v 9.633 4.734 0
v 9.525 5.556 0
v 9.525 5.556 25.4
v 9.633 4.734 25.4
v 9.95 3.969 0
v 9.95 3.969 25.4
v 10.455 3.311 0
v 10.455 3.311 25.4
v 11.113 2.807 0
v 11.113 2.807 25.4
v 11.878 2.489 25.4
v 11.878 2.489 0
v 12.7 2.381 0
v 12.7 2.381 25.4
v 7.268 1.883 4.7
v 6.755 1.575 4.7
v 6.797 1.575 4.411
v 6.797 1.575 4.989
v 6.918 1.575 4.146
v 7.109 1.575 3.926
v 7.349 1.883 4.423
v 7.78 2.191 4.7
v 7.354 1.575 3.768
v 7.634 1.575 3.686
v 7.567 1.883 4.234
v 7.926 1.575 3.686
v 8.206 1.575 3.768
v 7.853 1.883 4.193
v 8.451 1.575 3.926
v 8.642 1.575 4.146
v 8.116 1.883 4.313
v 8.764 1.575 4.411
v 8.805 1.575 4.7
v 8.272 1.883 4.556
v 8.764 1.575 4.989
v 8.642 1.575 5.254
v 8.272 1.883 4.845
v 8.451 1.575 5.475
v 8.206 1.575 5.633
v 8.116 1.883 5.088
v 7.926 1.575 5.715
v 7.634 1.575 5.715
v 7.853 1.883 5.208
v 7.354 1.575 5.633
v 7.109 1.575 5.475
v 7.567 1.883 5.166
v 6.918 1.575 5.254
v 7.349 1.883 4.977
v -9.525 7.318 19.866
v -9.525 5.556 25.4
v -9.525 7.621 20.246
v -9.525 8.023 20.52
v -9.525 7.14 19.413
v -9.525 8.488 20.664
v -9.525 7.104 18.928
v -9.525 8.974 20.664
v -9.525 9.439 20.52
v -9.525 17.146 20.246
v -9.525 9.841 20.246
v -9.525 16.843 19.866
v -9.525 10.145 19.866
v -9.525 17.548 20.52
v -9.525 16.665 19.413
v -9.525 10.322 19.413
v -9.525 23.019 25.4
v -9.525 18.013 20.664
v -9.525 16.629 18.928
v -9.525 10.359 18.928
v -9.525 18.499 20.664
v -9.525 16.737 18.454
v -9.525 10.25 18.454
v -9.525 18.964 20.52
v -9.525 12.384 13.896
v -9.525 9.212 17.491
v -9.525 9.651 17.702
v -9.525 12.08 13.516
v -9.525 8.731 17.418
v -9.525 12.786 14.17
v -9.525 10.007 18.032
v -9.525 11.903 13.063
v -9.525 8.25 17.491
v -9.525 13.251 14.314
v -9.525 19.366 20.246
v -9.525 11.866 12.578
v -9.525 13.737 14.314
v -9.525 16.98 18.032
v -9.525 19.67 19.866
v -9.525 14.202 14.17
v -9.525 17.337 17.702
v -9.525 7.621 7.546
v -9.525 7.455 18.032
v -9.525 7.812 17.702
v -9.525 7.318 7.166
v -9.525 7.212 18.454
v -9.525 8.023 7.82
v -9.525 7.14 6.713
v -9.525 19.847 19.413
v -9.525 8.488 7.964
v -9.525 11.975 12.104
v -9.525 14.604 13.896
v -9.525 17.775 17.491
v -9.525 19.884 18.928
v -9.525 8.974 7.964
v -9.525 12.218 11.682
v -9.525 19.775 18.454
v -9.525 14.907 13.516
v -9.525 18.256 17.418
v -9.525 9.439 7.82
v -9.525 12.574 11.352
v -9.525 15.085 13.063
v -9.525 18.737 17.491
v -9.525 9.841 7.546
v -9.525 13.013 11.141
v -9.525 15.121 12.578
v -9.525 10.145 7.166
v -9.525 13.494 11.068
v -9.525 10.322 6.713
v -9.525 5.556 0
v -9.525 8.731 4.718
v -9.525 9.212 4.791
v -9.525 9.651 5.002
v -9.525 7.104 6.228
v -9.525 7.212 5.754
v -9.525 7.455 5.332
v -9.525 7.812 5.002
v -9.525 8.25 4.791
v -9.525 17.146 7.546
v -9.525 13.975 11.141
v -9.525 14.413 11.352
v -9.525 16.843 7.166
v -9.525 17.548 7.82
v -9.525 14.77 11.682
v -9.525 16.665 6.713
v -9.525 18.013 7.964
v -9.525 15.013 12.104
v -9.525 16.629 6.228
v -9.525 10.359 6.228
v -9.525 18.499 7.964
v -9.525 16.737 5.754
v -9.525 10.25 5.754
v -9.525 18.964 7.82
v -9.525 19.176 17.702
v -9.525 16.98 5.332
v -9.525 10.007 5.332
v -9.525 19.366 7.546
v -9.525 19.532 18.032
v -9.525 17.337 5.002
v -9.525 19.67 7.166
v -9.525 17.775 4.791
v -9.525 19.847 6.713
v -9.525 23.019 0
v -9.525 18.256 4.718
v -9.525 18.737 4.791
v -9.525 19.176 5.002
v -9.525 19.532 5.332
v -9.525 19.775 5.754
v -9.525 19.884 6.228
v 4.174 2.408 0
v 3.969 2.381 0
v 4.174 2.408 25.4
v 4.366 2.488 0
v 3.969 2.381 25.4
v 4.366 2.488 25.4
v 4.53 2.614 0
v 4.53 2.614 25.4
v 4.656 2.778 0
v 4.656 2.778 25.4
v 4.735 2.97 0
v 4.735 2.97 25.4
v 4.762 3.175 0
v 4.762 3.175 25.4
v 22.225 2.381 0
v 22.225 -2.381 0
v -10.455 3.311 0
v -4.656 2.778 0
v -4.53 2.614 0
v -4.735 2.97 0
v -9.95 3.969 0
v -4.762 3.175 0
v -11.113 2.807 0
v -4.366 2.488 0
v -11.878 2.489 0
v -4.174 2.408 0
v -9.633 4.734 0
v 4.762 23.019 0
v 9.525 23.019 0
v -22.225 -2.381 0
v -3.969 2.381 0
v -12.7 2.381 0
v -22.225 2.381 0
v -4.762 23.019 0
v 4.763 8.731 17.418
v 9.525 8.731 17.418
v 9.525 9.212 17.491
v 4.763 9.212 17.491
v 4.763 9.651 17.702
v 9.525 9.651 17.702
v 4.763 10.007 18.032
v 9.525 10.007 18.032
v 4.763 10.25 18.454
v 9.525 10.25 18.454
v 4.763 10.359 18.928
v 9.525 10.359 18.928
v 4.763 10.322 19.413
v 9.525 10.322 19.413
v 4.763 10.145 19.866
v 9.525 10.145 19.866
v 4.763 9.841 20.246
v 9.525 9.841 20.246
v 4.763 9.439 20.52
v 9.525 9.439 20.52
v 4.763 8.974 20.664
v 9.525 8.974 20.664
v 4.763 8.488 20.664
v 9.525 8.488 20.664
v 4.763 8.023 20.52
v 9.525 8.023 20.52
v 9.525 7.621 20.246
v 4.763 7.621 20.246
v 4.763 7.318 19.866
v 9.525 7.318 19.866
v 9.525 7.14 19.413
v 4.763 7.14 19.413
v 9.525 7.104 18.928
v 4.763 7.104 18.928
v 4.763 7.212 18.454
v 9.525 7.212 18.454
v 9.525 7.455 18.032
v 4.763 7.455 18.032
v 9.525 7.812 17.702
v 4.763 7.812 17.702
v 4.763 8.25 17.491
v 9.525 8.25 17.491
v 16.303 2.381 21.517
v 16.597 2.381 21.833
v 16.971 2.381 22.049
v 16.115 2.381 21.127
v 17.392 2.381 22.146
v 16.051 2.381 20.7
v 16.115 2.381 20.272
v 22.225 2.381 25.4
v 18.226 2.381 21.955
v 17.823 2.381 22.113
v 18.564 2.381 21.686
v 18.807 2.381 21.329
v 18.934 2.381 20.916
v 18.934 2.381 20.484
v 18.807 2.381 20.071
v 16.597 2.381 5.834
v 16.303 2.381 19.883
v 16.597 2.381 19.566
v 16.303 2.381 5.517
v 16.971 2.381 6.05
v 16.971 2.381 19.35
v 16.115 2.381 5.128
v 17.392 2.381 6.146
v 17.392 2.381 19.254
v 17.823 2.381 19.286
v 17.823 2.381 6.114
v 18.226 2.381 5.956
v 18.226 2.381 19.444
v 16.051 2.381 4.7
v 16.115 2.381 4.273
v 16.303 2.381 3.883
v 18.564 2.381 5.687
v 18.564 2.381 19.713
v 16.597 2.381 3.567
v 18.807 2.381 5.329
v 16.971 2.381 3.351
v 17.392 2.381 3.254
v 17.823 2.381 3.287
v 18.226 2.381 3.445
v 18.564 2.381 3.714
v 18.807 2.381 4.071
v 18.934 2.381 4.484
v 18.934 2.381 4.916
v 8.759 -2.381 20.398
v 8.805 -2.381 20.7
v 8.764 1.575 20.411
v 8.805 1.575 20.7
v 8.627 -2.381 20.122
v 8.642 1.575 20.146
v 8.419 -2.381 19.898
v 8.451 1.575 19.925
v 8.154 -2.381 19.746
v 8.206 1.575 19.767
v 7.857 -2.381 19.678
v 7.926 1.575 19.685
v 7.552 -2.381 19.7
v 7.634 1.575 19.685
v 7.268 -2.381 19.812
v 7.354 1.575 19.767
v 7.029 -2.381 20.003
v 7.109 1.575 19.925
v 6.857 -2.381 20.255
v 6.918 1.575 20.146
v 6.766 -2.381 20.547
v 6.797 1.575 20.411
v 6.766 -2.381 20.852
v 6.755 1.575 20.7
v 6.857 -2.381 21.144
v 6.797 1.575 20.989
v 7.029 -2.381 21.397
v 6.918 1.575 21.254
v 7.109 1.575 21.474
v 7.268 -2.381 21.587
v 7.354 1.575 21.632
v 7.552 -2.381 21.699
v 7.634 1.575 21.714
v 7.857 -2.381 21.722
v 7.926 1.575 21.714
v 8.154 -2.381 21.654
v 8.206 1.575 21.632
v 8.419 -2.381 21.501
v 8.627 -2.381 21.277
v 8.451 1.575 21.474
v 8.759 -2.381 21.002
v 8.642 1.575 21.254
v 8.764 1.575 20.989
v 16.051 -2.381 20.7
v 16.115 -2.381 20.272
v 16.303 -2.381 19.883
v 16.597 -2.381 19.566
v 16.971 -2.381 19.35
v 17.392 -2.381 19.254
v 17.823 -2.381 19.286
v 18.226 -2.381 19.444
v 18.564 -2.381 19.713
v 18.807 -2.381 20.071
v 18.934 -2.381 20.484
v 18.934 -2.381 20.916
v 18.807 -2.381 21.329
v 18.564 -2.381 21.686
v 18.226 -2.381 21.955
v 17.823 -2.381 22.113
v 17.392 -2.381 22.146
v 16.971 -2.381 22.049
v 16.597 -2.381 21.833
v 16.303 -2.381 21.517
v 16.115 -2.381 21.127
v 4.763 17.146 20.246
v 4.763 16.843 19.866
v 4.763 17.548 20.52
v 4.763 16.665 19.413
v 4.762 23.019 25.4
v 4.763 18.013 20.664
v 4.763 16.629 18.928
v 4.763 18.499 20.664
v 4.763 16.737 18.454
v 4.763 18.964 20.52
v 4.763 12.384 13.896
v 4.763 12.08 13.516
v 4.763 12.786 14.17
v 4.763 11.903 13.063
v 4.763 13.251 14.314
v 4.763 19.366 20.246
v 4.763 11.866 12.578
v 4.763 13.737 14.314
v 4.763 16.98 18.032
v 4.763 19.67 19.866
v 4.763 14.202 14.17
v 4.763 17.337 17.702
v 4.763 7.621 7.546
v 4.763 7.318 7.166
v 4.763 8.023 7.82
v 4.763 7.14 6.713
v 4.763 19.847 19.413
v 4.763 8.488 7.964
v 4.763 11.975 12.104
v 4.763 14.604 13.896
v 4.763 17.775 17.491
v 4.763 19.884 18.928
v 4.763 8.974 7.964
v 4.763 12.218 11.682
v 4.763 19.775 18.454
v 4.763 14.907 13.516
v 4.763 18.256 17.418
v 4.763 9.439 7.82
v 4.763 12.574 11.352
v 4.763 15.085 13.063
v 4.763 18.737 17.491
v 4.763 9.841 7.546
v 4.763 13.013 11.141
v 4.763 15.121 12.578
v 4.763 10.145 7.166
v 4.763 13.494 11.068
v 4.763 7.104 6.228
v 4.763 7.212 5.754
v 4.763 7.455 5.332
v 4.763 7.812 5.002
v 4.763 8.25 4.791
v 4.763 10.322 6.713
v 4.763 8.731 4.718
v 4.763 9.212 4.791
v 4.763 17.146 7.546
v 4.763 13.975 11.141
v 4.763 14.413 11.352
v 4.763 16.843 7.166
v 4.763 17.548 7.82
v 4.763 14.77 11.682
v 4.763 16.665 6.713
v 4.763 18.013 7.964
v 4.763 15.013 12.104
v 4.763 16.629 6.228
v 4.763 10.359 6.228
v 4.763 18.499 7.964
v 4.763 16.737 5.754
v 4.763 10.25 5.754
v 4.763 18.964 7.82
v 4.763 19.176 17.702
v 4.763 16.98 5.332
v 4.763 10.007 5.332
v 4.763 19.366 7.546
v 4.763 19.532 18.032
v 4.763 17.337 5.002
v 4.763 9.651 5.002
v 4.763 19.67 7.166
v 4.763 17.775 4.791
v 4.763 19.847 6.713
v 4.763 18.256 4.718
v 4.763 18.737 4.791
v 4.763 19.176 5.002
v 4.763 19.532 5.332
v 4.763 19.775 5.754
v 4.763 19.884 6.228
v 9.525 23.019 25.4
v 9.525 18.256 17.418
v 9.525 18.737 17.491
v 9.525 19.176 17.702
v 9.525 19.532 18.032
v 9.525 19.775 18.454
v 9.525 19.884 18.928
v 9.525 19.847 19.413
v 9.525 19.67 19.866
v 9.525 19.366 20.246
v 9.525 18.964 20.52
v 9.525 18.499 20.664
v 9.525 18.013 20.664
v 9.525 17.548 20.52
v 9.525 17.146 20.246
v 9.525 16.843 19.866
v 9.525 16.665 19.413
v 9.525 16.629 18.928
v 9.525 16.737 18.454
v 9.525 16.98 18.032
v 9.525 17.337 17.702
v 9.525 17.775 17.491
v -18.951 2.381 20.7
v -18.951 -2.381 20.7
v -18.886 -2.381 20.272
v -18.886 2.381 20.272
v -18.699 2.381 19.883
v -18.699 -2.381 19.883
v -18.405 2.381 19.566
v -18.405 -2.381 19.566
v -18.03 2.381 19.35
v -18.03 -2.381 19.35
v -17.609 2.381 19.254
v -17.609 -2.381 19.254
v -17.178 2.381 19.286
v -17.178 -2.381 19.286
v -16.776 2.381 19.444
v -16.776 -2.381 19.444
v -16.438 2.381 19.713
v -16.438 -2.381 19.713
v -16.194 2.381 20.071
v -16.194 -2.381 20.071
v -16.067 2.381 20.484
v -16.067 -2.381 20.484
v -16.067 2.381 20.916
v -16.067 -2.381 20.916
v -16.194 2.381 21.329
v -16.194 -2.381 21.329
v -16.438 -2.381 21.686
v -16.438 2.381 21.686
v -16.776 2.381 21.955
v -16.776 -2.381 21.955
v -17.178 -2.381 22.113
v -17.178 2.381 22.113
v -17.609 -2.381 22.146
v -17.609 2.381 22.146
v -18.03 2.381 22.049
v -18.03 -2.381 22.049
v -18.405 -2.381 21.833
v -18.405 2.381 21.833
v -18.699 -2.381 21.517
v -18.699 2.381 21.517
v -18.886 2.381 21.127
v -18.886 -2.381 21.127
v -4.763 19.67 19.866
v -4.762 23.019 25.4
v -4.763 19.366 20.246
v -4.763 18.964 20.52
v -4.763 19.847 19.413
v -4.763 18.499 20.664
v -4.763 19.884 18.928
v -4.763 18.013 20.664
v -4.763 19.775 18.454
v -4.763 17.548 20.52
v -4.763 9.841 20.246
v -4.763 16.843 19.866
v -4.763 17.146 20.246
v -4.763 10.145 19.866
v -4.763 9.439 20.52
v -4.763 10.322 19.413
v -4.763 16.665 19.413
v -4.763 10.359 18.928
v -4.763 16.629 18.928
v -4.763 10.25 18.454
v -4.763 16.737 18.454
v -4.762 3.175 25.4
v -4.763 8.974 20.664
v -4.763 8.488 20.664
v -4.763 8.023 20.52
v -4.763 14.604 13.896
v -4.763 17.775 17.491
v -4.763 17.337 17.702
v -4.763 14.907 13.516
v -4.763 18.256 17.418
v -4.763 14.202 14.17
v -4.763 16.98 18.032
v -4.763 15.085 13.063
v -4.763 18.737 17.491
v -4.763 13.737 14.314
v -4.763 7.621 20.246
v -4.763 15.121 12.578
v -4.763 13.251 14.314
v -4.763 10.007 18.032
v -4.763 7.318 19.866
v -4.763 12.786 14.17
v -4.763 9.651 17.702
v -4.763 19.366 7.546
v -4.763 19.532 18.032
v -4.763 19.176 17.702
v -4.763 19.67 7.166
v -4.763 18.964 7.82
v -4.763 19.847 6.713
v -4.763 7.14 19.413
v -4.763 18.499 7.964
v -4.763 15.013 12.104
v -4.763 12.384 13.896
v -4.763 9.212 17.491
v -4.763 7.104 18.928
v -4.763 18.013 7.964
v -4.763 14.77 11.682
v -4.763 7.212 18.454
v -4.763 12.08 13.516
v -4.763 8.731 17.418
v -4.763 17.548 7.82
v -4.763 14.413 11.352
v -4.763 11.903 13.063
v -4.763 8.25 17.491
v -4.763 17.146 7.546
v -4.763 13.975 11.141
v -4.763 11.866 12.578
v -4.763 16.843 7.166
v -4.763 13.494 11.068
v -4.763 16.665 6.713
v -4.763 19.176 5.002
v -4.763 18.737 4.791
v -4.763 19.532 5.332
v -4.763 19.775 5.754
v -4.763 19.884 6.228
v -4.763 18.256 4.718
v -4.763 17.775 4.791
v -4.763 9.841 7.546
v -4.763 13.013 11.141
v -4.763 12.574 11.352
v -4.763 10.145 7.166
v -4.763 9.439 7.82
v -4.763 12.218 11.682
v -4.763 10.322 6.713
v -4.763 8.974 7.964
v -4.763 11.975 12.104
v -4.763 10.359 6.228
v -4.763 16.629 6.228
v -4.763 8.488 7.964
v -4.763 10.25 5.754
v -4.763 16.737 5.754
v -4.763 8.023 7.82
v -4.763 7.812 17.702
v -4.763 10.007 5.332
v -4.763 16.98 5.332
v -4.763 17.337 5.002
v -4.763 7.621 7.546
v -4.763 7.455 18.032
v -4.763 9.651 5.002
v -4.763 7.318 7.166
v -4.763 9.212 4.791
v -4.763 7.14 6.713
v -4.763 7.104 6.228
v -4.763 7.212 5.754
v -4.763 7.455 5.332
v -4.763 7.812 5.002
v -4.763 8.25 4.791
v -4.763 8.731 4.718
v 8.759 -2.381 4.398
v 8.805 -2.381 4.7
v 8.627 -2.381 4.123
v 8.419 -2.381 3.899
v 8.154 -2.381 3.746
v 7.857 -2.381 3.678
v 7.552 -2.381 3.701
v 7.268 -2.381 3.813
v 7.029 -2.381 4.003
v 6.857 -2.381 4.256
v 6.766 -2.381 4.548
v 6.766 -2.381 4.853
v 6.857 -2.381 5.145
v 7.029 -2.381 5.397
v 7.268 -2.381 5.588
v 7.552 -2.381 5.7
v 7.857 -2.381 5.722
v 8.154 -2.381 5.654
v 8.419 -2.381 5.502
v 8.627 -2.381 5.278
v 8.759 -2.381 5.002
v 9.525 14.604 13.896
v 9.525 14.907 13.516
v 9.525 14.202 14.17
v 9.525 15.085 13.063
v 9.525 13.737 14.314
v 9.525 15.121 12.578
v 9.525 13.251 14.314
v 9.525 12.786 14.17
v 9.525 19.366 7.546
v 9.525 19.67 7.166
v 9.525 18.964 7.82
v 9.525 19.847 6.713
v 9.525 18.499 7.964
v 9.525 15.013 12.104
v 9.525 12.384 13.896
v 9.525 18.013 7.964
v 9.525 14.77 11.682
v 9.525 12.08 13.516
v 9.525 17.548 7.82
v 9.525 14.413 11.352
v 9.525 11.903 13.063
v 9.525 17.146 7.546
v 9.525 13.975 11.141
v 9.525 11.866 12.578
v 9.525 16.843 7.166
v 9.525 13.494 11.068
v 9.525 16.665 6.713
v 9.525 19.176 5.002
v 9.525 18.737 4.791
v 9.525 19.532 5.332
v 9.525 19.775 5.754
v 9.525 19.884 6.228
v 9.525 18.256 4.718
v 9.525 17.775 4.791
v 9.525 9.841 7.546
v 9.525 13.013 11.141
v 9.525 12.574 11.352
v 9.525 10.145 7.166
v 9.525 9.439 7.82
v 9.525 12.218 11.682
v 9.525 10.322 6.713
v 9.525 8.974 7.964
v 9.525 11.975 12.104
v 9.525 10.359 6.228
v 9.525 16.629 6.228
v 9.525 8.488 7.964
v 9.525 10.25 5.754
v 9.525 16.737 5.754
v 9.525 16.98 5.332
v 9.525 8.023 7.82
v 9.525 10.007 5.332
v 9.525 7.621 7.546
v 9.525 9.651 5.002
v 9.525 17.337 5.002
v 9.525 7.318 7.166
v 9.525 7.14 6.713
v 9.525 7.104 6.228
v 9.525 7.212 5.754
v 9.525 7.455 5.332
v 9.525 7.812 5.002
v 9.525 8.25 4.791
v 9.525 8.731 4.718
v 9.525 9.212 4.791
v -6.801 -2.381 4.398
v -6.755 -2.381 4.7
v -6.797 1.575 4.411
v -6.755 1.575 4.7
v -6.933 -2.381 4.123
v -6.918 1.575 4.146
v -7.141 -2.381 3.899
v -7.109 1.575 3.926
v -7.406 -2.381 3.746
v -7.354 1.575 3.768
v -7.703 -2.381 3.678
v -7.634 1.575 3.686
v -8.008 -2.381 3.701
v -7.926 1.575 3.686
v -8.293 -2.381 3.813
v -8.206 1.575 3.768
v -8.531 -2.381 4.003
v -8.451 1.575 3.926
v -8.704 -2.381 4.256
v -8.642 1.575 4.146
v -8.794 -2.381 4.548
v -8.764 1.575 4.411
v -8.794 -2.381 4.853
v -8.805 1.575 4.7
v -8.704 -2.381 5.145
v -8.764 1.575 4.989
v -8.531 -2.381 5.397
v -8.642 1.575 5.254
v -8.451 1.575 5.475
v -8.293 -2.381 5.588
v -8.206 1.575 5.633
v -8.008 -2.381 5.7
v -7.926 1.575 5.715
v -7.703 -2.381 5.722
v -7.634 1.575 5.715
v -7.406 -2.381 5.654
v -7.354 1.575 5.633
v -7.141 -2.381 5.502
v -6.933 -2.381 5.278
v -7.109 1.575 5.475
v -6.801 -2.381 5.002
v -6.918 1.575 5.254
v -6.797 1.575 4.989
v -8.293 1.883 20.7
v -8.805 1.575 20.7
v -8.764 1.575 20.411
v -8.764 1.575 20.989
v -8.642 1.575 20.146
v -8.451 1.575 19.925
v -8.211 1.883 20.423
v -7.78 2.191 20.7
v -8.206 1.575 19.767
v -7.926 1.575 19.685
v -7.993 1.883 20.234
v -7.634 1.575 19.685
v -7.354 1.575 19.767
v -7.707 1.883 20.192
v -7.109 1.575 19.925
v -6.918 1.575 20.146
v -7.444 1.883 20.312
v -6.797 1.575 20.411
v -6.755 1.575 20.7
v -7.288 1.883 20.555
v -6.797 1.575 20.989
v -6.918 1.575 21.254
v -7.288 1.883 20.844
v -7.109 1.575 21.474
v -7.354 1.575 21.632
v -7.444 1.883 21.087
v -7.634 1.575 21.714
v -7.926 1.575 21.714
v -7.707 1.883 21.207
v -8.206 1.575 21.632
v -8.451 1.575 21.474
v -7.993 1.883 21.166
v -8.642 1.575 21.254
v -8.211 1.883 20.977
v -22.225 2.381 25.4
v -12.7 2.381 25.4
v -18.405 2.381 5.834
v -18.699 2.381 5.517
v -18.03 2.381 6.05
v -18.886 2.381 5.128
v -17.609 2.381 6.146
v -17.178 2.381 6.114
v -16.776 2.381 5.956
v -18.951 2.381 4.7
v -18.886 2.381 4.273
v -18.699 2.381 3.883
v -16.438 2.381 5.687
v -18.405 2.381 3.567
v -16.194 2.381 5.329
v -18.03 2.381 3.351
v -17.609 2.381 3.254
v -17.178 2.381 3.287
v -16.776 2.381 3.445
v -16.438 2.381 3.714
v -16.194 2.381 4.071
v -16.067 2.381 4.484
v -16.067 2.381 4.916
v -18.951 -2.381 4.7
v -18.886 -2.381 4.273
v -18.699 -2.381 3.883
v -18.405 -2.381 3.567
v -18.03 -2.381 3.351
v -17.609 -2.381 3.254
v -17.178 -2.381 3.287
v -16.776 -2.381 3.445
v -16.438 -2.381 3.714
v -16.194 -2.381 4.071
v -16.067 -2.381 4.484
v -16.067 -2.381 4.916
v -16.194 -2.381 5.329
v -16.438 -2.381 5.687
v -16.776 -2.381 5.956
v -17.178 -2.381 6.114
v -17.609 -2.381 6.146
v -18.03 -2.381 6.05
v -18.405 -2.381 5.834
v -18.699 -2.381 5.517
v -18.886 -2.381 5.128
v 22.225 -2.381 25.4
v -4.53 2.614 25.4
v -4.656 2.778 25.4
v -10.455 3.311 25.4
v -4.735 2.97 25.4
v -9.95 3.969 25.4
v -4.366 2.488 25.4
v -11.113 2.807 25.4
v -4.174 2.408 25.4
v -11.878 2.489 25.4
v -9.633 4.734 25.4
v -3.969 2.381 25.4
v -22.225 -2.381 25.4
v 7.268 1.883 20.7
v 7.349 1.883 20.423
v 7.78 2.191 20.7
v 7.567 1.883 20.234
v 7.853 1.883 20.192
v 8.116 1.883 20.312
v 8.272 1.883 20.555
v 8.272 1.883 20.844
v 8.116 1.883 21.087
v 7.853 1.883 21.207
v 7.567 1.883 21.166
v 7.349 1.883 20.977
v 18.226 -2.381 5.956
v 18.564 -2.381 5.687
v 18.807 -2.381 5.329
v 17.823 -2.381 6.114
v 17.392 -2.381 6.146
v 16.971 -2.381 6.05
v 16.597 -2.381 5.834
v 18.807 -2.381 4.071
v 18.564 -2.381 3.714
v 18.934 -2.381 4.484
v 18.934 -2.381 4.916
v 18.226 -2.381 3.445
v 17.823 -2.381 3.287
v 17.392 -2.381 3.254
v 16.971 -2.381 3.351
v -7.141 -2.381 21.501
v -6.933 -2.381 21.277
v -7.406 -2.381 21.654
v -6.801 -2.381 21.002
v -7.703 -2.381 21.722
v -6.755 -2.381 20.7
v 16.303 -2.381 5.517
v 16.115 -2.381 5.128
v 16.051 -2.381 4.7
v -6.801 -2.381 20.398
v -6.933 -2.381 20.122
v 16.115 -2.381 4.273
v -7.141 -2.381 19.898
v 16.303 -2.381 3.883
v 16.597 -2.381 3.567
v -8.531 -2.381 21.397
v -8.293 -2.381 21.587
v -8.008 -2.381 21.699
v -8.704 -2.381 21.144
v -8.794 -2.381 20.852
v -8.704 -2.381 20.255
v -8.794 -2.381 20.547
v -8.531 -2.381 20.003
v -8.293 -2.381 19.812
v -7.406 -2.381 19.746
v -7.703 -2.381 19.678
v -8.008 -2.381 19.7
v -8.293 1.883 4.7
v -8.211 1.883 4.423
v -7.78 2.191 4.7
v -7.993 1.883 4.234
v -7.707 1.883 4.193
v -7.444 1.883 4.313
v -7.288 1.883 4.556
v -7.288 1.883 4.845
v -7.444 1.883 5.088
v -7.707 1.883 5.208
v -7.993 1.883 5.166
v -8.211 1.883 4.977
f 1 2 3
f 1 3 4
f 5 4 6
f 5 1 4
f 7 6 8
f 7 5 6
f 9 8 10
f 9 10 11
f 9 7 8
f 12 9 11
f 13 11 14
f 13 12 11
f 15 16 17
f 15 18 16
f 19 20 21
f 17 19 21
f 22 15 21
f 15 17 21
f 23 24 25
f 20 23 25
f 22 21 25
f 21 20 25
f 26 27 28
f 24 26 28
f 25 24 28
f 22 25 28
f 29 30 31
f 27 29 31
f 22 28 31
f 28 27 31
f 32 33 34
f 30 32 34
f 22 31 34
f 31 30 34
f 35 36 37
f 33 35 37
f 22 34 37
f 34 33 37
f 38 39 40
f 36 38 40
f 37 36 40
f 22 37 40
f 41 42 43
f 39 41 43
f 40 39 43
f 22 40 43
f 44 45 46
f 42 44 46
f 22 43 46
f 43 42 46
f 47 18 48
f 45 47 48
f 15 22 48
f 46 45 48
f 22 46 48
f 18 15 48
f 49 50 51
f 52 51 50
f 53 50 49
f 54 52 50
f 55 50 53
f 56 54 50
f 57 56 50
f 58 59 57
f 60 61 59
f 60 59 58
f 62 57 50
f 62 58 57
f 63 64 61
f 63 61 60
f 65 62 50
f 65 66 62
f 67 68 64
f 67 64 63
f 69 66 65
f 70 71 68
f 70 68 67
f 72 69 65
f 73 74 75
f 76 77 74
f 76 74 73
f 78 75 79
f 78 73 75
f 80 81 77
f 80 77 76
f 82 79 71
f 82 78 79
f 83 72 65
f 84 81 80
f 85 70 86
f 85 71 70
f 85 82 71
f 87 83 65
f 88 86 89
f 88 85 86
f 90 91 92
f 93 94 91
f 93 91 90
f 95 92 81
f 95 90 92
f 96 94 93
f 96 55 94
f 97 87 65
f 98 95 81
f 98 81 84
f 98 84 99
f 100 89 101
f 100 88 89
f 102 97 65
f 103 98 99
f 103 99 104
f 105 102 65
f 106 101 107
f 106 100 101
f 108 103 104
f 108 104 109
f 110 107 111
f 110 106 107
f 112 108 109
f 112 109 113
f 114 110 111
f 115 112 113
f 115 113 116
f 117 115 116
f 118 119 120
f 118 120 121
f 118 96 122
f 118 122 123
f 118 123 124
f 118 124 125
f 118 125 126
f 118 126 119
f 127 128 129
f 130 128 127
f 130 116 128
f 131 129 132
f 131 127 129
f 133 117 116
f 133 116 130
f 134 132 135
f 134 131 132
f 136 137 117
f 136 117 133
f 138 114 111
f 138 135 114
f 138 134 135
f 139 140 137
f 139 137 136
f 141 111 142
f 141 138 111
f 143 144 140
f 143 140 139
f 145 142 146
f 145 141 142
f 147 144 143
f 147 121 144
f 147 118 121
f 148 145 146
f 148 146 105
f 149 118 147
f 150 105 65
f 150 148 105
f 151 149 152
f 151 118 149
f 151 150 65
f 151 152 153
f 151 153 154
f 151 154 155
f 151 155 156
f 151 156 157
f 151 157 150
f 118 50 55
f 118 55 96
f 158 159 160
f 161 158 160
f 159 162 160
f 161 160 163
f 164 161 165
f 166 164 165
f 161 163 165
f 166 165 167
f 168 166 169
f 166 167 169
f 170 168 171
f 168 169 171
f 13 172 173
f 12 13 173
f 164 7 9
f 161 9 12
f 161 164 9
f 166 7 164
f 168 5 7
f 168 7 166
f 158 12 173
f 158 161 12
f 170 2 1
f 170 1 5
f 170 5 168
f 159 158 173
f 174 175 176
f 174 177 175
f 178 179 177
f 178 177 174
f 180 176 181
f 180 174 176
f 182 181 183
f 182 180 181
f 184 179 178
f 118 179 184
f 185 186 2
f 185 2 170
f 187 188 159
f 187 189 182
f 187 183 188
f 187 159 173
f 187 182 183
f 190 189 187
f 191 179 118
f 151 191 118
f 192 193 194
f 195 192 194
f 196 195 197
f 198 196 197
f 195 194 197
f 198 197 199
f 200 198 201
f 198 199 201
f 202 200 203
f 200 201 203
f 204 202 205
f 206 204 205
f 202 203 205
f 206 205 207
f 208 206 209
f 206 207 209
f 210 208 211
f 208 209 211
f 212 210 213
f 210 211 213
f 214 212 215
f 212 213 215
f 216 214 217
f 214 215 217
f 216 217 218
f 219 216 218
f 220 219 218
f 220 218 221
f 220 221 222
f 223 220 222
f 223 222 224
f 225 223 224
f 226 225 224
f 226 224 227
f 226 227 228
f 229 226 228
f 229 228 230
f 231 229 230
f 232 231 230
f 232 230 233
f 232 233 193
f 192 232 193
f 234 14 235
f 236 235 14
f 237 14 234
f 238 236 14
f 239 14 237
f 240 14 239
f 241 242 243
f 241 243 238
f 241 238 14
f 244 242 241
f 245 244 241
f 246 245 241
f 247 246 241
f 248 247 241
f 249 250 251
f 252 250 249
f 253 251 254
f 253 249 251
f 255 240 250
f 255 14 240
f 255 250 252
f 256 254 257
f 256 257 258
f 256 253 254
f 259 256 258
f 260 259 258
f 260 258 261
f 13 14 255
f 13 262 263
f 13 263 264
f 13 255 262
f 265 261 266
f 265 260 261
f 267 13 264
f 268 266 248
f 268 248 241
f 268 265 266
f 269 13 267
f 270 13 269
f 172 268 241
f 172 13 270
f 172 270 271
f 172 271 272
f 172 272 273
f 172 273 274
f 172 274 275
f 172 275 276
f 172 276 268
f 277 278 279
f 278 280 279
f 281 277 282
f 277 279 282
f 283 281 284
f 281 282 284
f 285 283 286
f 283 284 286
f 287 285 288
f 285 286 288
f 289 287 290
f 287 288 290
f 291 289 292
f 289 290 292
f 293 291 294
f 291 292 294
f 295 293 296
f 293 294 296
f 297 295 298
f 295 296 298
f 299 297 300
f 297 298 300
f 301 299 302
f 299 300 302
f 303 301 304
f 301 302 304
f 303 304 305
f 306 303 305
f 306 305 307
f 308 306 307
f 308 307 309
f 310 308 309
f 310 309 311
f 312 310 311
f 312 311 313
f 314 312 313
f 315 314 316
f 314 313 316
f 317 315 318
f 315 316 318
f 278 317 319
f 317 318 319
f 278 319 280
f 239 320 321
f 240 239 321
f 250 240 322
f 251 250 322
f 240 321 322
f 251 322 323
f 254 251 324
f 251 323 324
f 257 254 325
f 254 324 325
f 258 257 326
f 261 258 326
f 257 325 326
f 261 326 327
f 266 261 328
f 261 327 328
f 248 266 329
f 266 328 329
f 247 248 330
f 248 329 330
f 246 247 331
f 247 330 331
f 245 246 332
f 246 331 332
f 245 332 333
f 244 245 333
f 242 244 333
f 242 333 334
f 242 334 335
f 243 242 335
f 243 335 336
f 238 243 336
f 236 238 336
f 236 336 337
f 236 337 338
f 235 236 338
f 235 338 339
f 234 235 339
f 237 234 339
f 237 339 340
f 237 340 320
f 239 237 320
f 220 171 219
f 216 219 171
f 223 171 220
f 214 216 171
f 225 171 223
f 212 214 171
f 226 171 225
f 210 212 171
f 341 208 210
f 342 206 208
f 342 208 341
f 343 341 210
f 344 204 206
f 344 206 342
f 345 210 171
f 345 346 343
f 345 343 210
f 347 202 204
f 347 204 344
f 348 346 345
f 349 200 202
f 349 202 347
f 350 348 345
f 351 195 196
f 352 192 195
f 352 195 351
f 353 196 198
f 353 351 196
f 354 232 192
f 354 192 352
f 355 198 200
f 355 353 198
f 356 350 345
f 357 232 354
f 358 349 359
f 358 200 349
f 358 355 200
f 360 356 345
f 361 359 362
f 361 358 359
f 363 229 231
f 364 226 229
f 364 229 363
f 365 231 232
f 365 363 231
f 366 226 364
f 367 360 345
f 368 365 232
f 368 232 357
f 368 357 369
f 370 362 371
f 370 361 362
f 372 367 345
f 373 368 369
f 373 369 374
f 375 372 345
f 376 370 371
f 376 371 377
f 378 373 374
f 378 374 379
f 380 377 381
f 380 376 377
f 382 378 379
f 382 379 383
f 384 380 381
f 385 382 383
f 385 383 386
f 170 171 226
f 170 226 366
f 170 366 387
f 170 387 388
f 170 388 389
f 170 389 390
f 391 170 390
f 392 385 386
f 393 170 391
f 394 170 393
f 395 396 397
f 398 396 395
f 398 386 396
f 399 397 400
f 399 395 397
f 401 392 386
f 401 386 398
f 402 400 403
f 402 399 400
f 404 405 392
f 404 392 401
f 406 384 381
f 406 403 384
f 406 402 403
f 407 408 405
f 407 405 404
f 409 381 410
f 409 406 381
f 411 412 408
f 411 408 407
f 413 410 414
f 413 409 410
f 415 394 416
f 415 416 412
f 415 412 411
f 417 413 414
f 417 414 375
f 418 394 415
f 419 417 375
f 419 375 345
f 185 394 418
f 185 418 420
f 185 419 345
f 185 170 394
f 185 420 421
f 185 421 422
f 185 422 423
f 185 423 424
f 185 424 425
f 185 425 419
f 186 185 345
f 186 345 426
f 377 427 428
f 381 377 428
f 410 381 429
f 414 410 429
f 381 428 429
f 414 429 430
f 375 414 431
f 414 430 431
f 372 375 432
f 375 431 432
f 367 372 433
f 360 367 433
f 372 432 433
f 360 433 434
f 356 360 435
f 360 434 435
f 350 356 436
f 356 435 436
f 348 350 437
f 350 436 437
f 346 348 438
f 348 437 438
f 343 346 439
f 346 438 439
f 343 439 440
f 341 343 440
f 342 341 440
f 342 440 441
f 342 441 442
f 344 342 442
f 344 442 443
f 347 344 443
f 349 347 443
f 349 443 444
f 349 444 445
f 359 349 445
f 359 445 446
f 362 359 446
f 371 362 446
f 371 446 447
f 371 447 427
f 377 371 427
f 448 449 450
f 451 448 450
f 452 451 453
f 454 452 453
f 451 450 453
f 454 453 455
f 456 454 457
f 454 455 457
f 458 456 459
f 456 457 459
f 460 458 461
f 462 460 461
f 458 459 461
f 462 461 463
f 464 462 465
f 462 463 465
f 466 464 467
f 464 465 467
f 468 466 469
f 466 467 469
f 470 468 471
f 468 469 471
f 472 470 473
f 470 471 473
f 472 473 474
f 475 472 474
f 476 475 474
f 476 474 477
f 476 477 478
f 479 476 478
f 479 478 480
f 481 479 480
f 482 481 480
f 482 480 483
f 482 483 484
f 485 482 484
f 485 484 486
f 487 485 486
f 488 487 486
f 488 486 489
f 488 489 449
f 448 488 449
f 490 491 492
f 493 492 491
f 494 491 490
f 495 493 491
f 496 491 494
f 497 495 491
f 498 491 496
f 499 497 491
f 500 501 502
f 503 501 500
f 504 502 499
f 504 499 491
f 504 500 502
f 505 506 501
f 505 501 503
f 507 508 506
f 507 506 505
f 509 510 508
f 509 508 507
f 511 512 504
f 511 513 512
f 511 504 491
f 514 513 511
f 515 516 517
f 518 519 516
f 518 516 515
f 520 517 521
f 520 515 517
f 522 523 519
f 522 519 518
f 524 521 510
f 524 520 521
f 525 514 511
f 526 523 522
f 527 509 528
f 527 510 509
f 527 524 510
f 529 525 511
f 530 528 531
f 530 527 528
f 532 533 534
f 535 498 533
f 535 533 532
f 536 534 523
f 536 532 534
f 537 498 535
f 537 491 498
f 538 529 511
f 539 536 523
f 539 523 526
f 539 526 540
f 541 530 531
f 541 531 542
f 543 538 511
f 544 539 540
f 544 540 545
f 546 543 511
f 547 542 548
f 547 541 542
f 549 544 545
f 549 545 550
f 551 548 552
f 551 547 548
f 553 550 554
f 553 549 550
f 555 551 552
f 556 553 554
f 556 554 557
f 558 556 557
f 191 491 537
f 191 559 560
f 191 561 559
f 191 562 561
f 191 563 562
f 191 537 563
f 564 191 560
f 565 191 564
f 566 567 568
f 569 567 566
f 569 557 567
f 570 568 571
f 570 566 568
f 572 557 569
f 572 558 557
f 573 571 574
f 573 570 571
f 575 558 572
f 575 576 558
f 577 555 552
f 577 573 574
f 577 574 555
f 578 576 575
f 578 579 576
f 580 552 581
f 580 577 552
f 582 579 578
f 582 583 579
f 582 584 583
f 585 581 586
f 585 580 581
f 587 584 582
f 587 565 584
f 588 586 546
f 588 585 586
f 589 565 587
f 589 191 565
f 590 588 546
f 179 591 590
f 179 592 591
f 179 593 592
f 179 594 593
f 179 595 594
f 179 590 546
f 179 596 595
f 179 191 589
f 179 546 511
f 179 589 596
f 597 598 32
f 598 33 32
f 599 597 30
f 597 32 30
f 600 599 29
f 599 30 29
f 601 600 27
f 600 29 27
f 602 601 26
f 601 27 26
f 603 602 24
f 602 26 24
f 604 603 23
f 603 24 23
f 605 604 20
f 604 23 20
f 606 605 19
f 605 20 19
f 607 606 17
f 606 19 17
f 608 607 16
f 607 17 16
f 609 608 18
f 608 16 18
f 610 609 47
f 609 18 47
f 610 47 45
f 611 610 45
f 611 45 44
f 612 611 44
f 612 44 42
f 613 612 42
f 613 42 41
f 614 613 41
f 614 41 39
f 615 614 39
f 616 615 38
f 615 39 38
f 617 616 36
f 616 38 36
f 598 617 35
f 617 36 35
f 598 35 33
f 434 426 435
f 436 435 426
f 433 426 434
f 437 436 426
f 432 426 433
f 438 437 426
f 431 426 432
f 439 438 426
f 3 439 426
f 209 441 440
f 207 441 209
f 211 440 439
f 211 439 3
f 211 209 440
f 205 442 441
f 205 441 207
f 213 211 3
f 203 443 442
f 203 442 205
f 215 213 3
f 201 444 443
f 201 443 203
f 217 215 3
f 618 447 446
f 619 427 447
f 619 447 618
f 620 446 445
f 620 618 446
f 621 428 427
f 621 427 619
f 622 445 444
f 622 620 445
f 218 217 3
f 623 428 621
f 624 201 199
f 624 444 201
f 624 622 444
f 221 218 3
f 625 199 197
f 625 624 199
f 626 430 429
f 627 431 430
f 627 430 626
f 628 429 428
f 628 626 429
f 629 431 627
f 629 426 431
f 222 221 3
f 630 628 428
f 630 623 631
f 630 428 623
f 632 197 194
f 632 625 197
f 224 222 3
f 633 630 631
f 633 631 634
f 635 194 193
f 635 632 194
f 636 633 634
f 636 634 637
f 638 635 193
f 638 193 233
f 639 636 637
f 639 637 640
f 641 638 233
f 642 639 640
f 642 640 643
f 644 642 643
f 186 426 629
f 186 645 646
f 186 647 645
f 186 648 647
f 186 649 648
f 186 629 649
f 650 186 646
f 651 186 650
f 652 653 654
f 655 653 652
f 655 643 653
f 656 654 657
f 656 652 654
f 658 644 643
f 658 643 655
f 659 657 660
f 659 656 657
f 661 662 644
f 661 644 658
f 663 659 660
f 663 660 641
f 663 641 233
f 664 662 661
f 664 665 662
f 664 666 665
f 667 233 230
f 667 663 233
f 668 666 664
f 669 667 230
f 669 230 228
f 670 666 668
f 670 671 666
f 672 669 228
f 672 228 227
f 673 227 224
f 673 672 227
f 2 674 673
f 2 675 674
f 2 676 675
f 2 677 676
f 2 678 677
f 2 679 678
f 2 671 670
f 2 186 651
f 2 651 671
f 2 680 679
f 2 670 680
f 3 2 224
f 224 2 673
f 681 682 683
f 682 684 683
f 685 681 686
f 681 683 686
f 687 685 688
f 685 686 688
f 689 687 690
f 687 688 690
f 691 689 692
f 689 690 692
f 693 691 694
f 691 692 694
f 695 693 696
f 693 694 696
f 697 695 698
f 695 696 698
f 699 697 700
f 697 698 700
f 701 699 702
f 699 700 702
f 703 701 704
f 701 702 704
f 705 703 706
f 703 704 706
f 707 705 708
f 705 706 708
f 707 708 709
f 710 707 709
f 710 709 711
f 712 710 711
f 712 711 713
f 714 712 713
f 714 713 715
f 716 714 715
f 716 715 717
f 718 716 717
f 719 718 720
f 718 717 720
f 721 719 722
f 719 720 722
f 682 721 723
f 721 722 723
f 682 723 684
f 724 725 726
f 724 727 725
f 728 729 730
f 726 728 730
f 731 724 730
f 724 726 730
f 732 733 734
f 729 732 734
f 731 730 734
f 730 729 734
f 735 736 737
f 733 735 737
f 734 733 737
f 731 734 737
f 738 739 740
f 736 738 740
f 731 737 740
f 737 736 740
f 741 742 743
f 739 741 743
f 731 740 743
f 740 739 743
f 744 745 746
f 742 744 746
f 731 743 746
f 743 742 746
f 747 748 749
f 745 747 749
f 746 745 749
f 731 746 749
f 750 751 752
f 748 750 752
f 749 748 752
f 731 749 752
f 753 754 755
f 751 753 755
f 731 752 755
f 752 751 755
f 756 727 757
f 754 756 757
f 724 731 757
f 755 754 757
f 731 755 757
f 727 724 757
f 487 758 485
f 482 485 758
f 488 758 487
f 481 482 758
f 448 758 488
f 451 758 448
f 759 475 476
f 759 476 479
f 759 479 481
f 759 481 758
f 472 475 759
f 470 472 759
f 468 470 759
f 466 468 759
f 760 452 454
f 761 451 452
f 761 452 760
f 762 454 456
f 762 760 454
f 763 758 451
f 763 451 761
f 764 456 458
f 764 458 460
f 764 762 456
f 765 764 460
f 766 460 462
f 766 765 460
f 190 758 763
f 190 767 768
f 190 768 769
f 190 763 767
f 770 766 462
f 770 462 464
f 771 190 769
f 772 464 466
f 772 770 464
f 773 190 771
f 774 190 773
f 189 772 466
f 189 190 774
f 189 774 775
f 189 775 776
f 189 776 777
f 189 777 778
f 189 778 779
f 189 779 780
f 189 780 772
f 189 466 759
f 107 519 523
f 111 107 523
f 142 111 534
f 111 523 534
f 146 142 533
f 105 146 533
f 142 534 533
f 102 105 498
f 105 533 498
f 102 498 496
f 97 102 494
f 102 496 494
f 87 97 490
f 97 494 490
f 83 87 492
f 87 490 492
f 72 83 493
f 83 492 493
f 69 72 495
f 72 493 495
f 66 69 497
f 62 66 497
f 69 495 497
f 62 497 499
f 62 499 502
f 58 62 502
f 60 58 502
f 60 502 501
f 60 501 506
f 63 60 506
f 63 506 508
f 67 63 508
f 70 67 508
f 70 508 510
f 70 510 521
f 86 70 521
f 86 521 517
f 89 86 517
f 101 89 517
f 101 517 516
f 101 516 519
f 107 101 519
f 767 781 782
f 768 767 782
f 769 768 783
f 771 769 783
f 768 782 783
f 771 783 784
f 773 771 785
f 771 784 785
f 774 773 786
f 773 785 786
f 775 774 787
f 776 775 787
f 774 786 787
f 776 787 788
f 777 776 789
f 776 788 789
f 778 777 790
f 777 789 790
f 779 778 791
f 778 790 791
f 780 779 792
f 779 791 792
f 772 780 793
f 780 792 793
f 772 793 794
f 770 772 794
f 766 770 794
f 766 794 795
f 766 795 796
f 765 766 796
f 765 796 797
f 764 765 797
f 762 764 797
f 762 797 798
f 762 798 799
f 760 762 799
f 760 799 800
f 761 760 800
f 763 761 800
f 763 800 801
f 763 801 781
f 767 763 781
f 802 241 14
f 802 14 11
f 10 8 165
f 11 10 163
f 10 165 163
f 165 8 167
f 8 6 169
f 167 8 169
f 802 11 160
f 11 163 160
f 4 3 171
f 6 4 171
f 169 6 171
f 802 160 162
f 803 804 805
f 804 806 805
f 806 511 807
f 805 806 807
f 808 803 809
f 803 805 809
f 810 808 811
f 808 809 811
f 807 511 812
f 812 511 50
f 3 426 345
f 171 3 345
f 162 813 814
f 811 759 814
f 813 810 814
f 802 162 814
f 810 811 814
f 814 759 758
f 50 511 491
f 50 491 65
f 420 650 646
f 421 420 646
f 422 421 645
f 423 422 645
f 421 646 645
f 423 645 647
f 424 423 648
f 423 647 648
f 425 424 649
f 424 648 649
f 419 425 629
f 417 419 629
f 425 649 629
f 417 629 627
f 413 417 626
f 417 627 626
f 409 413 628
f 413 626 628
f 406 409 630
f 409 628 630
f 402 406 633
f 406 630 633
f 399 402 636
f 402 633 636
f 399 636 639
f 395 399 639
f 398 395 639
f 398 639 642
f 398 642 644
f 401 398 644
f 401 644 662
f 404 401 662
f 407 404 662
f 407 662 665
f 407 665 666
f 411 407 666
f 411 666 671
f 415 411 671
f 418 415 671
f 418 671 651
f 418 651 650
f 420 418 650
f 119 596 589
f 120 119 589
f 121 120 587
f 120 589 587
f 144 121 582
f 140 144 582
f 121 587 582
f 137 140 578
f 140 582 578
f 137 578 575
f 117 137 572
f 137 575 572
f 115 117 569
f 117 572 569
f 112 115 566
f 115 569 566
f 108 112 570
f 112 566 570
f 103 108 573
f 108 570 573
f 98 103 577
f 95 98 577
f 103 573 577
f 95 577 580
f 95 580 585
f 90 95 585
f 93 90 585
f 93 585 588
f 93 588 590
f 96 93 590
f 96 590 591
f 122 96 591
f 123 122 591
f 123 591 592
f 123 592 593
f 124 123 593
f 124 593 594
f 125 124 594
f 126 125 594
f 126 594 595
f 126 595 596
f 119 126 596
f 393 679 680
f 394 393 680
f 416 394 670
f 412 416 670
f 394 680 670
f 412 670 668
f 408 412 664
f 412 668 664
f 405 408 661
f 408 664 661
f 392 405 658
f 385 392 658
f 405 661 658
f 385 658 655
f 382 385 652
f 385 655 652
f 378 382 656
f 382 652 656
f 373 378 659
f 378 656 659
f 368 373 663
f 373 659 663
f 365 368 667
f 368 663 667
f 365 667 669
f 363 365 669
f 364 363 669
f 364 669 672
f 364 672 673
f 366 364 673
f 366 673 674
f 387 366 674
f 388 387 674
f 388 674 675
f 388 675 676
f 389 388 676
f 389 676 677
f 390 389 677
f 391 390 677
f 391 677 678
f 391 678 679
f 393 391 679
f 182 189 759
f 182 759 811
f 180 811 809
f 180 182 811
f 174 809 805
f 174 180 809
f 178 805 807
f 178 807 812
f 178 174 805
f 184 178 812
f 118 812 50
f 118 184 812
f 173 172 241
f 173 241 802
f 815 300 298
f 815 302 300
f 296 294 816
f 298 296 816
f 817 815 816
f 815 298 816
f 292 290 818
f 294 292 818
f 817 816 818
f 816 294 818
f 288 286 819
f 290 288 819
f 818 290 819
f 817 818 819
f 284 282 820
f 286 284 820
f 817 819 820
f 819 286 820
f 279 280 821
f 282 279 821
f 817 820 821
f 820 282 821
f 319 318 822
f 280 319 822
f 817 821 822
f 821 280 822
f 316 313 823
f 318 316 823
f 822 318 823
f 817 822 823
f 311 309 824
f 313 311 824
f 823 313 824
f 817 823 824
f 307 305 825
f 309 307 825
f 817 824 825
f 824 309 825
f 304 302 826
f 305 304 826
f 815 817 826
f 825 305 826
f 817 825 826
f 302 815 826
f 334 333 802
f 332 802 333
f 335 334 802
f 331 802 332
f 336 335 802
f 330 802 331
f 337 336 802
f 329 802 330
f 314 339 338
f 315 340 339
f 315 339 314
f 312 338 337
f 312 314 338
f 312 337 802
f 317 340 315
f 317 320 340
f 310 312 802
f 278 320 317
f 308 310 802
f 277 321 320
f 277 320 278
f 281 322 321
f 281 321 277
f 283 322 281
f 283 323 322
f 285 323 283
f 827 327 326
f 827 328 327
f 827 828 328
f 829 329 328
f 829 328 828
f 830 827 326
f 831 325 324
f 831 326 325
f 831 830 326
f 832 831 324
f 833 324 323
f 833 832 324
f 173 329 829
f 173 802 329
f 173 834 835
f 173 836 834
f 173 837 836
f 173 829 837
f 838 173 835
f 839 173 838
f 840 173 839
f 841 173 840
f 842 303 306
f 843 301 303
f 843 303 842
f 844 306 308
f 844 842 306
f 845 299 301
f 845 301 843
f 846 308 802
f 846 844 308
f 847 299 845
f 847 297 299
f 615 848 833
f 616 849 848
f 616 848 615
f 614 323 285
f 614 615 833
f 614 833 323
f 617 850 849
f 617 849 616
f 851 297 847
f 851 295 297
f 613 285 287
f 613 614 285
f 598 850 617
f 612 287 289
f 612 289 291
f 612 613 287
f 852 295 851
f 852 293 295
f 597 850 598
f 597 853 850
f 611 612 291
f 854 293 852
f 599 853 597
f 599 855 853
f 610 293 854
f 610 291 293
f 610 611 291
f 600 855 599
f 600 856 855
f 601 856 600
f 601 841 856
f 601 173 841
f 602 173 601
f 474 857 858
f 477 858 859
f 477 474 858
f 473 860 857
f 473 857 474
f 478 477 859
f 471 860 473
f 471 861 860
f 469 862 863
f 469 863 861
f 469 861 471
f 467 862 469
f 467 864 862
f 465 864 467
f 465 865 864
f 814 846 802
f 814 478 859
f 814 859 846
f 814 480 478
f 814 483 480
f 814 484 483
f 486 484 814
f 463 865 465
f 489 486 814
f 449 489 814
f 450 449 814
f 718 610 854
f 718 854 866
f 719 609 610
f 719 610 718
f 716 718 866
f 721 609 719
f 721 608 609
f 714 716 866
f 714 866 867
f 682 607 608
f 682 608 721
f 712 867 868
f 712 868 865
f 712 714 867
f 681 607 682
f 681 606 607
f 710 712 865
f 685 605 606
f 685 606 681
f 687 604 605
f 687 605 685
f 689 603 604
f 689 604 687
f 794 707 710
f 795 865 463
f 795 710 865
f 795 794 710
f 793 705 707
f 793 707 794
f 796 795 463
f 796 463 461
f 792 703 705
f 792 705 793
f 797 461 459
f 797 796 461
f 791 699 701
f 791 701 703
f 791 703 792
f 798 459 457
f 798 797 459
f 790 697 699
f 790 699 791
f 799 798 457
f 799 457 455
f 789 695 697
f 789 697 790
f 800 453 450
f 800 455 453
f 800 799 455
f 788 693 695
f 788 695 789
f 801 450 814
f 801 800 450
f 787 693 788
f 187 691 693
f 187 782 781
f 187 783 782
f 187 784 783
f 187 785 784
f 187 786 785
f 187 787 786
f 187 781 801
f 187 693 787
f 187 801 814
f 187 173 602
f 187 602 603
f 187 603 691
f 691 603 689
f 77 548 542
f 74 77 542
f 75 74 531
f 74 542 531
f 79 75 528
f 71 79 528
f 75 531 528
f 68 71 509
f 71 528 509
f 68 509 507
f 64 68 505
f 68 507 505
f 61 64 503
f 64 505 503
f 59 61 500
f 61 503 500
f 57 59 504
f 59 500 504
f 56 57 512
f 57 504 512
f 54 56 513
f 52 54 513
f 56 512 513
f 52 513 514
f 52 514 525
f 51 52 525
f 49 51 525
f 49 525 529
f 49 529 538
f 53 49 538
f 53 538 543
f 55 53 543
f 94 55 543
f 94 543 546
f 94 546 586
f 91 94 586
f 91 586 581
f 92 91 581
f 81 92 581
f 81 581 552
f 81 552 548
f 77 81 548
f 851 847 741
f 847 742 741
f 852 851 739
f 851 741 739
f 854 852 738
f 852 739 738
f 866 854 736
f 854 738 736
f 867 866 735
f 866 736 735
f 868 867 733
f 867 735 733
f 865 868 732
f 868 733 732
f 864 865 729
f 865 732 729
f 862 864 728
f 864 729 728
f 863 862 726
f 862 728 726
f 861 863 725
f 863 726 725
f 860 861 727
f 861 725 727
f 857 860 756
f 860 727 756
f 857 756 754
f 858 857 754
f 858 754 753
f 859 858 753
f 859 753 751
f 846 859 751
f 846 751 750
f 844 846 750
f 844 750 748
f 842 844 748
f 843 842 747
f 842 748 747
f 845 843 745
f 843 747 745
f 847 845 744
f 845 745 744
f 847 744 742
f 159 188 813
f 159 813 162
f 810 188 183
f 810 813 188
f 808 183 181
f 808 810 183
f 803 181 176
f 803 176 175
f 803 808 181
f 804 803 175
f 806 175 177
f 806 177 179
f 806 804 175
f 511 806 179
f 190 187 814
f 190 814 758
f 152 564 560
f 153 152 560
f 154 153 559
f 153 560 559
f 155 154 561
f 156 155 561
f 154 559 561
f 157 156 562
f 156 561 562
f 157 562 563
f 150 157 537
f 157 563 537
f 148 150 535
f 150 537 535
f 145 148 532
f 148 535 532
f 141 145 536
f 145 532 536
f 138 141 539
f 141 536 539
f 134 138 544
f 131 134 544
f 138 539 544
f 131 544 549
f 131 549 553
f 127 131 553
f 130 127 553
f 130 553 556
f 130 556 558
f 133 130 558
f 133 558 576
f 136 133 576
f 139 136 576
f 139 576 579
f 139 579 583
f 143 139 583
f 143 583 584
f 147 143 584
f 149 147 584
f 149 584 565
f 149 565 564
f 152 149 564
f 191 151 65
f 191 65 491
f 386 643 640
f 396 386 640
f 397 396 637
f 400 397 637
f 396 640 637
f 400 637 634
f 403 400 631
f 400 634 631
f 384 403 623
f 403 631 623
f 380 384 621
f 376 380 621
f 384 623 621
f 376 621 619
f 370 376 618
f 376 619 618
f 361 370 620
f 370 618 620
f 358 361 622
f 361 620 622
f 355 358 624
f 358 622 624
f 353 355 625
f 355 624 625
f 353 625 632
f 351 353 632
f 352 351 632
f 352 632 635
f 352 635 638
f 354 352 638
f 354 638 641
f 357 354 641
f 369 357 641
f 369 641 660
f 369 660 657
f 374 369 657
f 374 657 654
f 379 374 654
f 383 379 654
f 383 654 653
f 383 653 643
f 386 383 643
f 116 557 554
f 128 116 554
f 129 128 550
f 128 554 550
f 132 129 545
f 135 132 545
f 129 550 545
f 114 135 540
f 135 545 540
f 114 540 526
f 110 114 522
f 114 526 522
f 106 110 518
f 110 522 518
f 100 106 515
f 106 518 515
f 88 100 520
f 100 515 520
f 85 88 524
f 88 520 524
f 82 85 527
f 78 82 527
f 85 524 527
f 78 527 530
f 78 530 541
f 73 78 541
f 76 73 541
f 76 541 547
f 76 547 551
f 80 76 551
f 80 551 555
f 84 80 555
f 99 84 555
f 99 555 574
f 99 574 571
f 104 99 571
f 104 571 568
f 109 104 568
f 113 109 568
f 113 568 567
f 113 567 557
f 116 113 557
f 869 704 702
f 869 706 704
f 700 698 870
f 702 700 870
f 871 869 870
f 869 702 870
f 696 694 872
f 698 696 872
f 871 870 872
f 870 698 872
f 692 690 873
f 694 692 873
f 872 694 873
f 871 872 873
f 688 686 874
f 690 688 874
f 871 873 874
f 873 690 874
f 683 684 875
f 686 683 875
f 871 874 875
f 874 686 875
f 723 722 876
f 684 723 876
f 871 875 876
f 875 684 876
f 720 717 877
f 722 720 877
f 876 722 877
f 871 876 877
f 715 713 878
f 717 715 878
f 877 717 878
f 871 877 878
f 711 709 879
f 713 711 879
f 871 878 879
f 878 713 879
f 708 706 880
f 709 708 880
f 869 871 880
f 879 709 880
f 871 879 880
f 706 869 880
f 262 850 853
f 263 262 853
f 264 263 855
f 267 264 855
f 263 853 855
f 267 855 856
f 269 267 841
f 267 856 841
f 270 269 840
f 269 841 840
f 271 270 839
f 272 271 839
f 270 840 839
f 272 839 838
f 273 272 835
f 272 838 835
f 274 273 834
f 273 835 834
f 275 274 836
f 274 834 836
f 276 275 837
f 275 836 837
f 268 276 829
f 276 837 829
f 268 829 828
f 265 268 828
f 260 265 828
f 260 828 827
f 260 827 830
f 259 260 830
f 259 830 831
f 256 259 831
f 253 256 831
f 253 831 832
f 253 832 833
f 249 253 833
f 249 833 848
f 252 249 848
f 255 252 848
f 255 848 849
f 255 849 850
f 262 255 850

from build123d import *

# Parameters (mm, degrees)
BOSS_EXTRUDE1_DEPTH          = 25.4
FILLET1_R                    = 0.79375
M2_5_CLEARANCE_HOLE1_D       = 2.9
M2_5X0_45_TAPPED_HOLE1_D     = 2.05
M2_5X0_45_TAPPED_HOLE1_DEPTH = 3.956117865
M2_5X0_45_TAPPED_HOLE1_TIP   = 0.615882135
F_4_CLEARANCE_HOLE1_D        = 3.2639


with BuildPart() as part:
    # Sketch1 → Boss-Extrude1 (new body)
    with BuildSketch(Plane.XY):
        with BuildLine():
            Line((-4.7625, 2.38125), (4.7625, 2.38125))
            Line((4.7625, 2.38125), (4.7625, 23.01875))
            Line((4.7625, 23.01875), (9.525, 23.01875))
            Line((9.525, 23.01875), (9.525, 5.55625))
            ThreePointArc((9.525, 5.55625), (10.45493597, 3.31118597), (12.7, 2.38125))
            Line((12.7, 2.38125), (22.225, 2.38125))
            Line((22.225, 2.38125), (22.225, -2.38125))
            Line((22.225, -2.38125), (-22.225, -2.38125))
            Line((-22.225, -2.38125), (-22.225, 2.38125))
            Line((-22.225, 2.38125), (-12.7, 2.38125))
            ThreePointArc((-12.7, 2.38125), (-10.45493597, 3.31118597), (-9.525, 5.55625))
            Line((-9.525, 5.55625), (-9.525, 23.01875))
            Line((-9.525, 23.01875), (-4.7625, 23.01875))
            Line((-4.7625, 23.01875), (-4.7625, 2.38125))
        make_face()
    extrude(amount=BOSS_EXTRUDE1_DEPTH)

    # Fillet1
    fillet1_edges = [part.edges().sort_by_distance(p)[0] for p in [
        (-4.7625, 2.38125, 12.7),
        (4.7625, 2.38125, 12.7),
    ]]
    fillet(fillet1_edges, radius=FILLET1_R)

    # M2.5 Clearance Hole1 (through all)
    with Locations(Plane(origin=(0, 2.38125, 0), x_dir=(1, 0, 0), z_dir=(0, 1, 0))):
        with Locations((17.5006, -4.70027), (17.5006, -20.69973), (-17.5006, -20.69973), (-17.5006, -4.70027)):
            Hole(M2_5_CLEARANCE_HOLE1_D / 2)

    # M2.5x0.45 Tapped Hole1
    with Locations(Plane(origin=(0, -2.38125, 0), x_dir=(-1, 0, 0), z_dir=(0, -1, 0))):
        with Locations((-7.78002, -4.70027), (7.78002, -4.70027), (7.78002, -20.69973), (-7.78002, -20.69973)):
            Hole(M2_5X0_45_TAPPED_HOLE1_D / 2, depth=M2_5X0_45_TAPPED_HOLE1_DEPTH)
            with Locations((0, 0, -(M2_5X0_45_TAPPED_HOLE1_DEPTH + M2_5X0_45_TAPPED_HOLE1_TIP / 2))):  # 118° drill point
                Cone(0, M2_5X0_45_TAPPED_HOLE1_D / 2, M2_5X0_45_TAPPED_HOLE1_TIP, mode=Mode.SUBTRACT)

    # #4 Clearance Hole1 (through all)
    with Locations(Plane.ZY.offset(9.525)):
        with Locations((6.35, 18.25625), (19.05, 18.25625), (19.05, 8.73125), (6.35, 8.73125), (12.7, 13.49375)):
            Hole(F_4_CLEARANCE_HOLE1_D / 2)


solid = part.part
